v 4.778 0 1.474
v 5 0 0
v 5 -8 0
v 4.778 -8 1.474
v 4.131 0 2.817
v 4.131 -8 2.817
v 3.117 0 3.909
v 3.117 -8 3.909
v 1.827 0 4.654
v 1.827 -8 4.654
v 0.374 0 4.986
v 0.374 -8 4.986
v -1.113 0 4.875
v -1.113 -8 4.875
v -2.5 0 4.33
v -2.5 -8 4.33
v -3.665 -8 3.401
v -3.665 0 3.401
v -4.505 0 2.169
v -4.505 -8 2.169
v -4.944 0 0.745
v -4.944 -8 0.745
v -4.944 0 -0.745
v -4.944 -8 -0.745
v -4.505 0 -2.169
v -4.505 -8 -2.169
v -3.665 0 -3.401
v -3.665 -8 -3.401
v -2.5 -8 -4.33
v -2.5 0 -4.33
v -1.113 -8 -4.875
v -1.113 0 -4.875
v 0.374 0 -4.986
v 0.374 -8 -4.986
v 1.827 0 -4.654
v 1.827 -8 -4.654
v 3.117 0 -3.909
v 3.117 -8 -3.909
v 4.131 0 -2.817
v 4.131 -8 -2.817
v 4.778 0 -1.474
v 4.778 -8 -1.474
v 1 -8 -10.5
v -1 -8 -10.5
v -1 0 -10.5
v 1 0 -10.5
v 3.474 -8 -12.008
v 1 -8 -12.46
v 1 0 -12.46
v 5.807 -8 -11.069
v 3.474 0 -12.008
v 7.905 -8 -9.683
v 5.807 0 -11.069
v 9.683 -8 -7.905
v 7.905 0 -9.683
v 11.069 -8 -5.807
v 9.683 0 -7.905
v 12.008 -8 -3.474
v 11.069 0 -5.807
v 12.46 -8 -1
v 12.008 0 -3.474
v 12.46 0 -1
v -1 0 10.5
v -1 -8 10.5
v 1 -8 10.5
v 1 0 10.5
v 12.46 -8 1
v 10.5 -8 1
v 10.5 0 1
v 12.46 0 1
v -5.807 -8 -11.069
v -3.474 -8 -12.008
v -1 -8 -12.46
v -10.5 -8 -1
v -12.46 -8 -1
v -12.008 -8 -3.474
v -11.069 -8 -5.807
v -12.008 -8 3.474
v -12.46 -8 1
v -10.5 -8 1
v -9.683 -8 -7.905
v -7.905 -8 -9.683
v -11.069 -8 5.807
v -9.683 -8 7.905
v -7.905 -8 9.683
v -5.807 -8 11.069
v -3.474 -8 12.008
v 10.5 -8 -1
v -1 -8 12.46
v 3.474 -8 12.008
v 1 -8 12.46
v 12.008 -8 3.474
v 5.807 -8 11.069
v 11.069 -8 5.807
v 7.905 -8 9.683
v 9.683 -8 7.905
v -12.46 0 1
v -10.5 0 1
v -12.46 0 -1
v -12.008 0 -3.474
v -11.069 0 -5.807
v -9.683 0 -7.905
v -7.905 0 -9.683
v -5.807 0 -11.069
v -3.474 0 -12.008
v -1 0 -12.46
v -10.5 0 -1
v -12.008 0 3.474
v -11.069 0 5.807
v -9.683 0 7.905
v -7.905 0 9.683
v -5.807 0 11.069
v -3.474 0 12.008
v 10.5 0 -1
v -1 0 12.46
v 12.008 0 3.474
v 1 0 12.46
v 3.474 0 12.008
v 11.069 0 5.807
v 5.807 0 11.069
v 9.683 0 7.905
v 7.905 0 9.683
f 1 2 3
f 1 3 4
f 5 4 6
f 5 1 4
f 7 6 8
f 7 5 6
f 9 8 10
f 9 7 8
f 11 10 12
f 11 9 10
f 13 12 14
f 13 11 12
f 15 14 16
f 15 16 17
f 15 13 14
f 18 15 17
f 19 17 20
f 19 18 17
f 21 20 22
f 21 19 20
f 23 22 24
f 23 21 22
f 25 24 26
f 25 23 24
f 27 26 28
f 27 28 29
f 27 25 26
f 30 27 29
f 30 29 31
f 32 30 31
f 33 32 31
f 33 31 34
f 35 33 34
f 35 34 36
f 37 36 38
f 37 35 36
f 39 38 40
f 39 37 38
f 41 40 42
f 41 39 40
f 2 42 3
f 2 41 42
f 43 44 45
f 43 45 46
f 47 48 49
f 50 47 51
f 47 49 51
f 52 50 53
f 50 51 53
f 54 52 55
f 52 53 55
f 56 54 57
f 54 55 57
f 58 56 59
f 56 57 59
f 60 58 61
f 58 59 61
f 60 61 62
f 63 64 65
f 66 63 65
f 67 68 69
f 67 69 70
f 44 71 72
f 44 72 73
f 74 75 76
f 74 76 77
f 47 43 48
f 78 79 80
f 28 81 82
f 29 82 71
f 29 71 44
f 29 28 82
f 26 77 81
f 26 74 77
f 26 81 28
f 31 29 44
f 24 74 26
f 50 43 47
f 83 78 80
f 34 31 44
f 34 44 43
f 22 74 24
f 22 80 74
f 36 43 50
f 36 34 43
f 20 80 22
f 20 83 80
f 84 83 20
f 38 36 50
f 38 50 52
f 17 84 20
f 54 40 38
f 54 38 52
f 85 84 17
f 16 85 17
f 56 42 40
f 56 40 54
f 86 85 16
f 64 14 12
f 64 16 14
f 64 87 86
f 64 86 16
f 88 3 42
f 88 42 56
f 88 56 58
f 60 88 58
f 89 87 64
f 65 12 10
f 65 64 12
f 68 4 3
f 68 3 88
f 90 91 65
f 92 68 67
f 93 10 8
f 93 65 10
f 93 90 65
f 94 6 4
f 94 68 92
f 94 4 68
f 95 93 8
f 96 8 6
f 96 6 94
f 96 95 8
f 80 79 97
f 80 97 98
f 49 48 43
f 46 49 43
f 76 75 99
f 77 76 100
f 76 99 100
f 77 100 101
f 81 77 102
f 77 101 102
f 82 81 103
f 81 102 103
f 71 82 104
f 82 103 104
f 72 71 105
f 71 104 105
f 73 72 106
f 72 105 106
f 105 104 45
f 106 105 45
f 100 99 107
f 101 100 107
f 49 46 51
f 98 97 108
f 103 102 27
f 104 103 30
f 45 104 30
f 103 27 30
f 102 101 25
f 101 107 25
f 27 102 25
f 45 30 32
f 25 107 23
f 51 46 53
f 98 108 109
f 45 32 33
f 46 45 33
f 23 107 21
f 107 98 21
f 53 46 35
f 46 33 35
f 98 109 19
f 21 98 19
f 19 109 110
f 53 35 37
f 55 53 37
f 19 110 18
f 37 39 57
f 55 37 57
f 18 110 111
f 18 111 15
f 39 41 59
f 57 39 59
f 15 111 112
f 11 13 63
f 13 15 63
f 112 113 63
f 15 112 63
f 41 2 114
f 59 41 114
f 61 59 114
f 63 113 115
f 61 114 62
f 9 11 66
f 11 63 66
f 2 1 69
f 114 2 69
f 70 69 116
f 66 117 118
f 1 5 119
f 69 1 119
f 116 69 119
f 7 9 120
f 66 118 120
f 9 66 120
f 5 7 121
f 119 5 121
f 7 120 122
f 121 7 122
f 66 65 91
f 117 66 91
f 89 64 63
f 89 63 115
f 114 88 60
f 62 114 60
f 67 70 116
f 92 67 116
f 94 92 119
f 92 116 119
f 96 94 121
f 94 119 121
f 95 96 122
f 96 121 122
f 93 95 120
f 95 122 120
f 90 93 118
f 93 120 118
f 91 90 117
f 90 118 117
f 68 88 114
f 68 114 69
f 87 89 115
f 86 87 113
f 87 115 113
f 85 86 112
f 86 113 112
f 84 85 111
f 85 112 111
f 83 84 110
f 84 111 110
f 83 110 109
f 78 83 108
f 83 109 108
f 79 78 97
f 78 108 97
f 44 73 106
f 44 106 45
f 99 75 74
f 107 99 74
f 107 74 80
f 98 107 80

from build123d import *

# Parameters (mm, degrees)
SKETCH_R        = 12.5
SKETCH_R_2      = 5
PAD_DEPTH       = 8
SKETCH001_W     = 8.228719
SKETCH001_H     = 2
SKETCH001_W_2   = 5.633815
POCKET_DEPTH    = 8.001
SKETCH002_W     = 2
SKETCH002_H     = 3.680985
SKETCH002_H_2   = 3.52239
POCKET001_DEPTH = 8.001


with BuildPart() as part:
    # Sketch → Pad (new body)
    with BuildSketch(Plane.XZ):
        Circle(SKETCH_R)
        Circle(SKETCH_R_2, mode=Mode.SUBTRACT)
    extrude(amount=PAD_DEPTH)

    # Sketch001 → Pocket (cut, through all)
    with BuildSketch(Plane.XZ.offset(8)):
        with Locations((14.614359, 0)):
            Rectangle(SKETCH001_W, SKETCH001_H)
        with Locations((-13.316907, 0)):
            Rectangle(SKETCH001_W_2, SKETCH001_H)
    extrude(amount=-POCKET_DEPTH, mode=Mode.SUBTRACT)

    # Sketch002 → Pocket001 (cut, through all)
    with BuildSketch(Plane.XZ.offset(8)):
        with Locations((0, 12.340492)):
            Rectangle(SKETCH002_W, SKETCH002_H)
        with Locations((0, -12.261195)):
            Rectangle(SKETCH002_W, SKETCH002_H_2)
    extrude(amount=-POCKET001_DEPTH, mode=Mode.SUBTRACT)


solid = part.part
